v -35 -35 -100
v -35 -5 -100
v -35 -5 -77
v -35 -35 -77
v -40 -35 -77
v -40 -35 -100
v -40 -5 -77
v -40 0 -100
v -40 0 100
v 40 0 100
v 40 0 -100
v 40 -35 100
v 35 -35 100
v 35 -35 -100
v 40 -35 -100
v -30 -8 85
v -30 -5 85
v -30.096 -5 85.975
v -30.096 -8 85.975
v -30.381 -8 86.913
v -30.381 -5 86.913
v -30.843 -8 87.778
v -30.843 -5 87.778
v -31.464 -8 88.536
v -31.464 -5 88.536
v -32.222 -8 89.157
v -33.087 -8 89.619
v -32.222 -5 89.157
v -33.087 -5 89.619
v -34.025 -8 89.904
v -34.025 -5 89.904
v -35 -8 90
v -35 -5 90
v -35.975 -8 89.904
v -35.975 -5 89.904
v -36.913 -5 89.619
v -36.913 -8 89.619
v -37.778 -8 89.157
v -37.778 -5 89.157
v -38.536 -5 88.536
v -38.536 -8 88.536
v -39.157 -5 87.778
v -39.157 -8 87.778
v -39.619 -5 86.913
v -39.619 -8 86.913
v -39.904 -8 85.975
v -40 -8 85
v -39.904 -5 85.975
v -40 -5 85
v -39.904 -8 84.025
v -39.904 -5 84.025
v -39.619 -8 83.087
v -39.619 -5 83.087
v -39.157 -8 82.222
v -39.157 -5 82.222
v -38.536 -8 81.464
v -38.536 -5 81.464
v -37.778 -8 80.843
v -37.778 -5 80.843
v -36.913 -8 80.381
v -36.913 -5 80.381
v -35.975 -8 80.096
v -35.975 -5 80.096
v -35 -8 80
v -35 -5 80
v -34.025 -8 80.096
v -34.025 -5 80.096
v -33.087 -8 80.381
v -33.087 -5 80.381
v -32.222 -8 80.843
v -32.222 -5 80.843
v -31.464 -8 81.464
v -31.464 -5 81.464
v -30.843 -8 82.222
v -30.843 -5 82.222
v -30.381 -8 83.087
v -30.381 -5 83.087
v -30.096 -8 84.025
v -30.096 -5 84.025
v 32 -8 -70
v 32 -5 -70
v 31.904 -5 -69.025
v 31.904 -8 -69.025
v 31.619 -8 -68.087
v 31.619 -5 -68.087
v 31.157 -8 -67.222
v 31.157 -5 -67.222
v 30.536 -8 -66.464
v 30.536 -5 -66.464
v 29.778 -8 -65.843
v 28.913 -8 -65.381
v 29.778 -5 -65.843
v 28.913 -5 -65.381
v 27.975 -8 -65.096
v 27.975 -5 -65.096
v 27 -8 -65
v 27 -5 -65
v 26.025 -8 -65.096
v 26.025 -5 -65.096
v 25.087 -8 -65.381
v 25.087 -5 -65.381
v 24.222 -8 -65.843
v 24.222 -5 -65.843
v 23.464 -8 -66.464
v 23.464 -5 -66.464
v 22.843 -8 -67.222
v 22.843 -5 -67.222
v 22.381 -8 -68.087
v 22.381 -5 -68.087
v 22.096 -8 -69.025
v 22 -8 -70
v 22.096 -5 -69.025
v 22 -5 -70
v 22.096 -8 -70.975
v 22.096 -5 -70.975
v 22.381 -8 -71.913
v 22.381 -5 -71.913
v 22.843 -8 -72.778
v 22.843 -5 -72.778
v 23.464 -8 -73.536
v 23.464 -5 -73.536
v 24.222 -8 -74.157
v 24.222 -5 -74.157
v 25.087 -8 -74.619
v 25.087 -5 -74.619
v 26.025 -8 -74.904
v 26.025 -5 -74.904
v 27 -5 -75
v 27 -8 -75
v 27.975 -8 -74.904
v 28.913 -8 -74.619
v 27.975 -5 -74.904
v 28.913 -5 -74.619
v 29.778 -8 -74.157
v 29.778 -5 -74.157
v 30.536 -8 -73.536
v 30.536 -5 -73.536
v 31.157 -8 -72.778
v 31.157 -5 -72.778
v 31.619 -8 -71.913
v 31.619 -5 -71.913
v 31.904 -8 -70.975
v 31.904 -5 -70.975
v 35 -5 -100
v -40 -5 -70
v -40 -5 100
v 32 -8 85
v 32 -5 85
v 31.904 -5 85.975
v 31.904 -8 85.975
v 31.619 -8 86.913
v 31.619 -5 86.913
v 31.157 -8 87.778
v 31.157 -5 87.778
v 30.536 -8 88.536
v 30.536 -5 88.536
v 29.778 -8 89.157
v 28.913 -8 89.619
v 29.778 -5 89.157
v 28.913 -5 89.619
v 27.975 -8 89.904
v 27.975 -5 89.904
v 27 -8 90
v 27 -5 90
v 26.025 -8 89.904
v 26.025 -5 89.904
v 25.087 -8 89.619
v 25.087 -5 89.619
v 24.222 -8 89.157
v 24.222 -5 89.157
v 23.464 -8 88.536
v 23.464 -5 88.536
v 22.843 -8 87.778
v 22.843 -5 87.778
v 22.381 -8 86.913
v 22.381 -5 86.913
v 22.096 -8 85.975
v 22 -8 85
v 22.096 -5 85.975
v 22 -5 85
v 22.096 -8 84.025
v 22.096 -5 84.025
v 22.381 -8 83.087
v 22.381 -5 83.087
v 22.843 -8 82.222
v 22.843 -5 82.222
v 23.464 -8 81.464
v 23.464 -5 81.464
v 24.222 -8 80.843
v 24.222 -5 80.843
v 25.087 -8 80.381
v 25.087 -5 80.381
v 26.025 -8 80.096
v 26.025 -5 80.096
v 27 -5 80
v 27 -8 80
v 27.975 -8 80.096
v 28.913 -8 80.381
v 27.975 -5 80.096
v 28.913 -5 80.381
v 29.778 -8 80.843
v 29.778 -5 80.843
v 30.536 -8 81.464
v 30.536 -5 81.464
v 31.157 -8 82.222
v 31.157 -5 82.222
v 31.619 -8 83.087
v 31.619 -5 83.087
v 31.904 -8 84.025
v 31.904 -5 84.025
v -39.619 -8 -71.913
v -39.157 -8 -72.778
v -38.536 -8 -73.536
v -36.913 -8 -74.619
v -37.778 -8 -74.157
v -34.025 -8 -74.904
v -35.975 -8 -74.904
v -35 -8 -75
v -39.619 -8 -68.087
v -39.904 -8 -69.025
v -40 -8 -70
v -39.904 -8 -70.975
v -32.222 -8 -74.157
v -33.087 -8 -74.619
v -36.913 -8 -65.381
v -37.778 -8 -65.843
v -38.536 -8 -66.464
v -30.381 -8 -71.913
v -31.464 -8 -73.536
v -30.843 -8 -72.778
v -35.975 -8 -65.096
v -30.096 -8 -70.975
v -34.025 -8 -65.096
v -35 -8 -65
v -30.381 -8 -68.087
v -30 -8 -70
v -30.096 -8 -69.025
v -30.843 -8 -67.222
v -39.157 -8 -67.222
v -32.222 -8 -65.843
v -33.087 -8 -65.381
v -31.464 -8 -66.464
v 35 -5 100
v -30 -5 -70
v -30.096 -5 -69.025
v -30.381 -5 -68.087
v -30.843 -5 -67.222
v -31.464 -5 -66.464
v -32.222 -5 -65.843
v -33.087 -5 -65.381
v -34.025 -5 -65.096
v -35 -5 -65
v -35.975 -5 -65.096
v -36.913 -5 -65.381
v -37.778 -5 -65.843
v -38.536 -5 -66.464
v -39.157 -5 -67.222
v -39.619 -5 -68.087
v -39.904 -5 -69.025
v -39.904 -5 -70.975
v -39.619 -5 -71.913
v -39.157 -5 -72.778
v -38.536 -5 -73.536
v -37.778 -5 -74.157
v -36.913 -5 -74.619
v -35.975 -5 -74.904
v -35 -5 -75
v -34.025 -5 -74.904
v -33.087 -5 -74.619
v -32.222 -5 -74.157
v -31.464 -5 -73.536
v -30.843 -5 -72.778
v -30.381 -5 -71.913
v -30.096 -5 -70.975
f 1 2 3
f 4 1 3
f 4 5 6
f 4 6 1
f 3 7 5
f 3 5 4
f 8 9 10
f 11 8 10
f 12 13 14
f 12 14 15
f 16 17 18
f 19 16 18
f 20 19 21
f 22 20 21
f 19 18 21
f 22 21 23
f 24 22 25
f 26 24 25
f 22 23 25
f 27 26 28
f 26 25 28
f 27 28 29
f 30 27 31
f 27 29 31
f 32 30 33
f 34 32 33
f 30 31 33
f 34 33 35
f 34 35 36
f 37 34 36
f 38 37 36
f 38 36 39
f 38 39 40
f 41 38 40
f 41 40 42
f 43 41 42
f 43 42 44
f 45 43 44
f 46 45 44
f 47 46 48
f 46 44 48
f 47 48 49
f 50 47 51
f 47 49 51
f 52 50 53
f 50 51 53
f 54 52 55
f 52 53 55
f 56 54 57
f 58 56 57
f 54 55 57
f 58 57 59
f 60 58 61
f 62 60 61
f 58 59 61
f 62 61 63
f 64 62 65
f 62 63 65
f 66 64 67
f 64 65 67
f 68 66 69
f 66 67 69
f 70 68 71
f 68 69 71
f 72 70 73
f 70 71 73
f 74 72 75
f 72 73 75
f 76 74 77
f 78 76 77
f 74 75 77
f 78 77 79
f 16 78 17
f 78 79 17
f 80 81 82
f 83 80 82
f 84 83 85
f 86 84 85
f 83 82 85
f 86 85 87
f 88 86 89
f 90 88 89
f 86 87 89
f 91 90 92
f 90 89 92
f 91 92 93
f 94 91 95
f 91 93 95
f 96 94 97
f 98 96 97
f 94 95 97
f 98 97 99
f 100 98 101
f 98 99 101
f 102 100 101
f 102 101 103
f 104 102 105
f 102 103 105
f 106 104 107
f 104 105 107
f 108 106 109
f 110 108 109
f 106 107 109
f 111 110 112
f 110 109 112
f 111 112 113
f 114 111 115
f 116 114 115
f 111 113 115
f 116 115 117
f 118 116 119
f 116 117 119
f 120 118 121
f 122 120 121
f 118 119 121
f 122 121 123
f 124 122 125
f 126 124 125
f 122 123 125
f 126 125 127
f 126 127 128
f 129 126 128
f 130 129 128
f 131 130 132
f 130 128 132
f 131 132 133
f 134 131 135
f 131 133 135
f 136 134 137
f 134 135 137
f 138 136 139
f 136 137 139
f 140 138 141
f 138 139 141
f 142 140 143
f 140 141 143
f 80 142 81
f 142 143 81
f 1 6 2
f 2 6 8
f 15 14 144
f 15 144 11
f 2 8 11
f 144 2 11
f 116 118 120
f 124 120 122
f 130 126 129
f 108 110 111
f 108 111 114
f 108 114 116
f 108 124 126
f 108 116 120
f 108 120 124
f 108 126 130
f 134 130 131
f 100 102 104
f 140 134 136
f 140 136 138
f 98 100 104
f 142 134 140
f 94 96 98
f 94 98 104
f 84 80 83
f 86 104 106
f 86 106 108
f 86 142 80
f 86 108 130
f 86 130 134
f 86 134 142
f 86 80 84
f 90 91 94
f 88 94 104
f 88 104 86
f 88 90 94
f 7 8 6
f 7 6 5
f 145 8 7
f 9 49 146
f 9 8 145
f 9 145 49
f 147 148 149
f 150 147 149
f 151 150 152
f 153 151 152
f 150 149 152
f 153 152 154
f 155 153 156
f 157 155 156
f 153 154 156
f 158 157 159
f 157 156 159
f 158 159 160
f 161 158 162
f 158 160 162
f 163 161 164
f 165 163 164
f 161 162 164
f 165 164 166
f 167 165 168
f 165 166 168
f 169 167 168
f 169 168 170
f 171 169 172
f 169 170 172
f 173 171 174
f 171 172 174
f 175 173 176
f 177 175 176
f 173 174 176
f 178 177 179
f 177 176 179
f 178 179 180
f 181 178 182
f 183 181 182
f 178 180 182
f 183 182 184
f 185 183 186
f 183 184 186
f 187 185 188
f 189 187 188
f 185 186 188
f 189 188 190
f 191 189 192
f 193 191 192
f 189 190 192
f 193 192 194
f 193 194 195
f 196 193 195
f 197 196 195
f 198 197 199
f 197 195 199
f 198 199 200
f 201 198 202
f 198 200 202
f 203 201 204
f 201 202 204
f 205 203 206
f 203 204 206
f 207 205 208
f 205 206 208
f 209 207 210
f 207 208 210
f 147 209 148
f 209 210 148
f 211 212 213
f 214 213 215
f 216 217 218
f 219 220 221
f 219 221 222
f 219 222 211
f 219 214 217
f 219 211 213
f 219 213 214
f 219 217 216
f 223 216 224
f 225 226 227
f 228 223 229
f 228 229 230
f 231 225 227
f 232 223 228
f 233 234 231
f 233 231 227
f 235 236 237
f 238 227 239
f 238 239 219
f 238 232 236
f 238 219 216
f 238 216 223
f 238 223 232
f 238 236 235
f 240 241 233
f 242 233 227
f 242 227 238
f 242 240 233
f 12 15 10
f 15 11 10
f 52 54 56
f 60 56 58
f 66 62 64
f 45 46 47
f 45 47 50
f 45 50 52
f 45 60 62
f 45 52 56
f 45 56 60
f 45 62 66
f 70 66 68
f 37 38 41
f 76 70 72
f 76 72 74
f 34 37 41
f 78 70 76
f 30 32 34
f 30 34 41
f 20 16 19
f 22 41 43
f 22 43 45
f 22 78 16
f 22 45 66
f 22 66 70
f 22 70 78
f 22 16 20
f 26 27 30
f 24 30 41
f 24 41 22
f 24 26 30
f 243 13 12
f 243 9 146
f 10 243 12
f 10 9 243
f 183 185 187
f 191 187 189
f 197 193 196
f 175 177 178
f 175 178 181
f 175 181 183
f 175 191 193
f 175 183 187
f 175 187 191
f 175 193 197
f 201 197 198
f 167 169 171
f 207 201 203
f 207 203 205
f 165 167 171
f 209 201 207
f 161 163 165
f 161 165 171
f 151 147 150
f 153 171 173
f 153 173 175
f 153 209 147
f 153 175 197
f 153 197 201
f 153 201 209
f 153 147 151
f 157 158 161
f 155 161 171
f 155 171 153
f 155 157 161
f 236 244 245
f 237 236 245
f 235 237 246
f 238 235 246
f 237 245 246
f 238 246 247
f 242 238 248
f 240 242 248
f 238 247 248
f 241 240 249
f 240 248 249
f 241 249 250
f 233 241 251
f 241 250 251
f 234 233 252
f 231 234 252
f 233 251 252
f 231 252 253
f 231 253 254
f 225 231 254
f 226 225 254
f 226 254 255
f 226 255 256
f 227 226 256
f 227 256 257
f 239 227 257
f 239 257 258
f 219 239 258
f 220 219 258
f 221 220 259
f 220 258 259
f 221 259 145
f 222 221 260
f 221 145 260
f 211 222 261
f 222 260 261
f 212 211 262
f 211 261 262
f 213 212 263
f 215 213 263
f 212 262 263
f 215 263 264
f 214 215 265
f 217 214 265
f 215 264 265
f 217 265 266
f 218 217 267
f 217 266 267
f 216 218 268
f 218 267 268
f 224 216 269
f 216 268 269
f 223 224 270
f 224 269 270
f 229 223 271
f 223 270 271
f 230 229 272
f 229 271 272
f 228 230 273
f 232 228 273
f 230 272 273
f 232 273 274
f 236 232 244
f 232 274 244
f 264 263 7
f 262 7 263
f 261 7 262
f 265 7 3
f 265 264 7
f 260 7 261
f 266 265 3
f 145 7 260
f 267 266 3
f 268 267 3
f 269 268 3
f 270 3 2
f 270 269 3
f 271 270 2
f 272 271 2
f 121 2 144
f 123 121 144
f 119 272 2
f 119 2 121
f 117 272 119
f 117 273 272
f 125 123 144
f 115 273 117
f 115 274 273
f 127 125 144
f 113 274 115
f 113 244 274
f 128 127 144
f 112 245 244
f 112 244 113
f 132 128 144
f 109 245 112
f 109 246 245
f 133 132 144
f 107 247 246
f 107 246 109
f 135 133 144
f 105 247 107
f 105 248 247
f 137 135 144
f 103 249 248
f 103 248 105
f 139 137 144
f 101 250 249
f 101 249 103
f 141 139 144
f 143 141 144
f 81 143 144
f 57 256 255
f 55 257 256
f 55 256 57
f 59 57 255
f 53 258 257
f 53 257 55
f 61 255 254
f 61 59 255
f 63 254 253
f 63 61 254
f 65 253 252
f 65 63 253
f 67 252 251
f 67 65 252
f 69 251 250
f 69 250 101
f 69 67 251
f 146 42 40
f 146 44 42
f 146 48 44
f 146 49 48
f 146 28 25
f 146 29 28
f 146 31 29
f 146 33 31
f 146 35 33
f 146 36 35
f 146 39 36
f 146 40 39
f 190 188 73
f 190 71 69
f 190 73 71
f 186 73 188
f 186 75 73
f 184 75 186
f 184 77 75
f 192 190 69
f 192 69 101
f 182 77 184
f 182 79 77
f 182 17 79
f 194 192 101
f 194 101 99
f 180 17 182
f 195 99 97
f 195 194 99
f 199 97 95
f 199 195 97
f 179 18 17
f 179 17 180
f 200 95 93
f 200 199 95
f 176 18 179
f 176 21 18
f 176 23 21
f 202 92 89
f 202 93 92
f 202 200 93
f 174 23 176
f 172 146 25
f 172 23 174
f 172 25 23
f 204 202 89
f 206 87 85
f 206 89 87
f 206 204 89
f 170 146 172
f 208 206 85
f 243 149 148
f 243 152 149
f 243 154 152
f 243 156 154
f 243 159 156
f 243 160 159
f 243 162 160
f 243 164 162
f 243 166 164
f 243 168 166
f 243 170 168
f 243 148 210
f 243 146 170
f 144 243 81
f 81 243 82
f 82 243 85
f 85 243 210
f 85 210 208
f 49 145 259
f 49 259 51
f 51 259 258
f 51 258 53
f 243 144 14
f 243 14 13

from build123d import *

# Parameters (mm, degrees)
SKETCH_W      = 80
SKETCH_H      = 200
PAD_DEPTH     = 5
SKETCH001_R   = 5
PAD001_DEPTH  = 3
SKETCH002_W   = 5
SKETCH002_H   = 200
SKETCH002_H_2 = 23
PAD002_DEPTH  = 30


with BuildPart() as part:
    # Sketch → Pad (new body)
    with BuildSketch(Plane.XZ):
        Rectangle(SKETCH_W, SKETCH_H)
    extrude(amount=PAD_DEPTH)

    # Sketch001 (on Face6 of Pad) → Pad001 (join)
    with BuildSketch(Plane.XZ.offset(5)):
        with Locations((-35, 85)):
            Circle(SKETCH001_R)
        with Locations((27, 85)):
            Circle(SKETCH001_R)
        with Locations((-35, -70)):
            Circle(SKETCH001_R)
        with Locations((27, -70)):
            Circle(SKETCH001_R)
    extrude(amount=PAD001_DEPTH)

    # Sketch002 (on Face5 of Pad001) → Pad002 (join)
    with BuildSketch(Plane.XZ.offset(5)):
        with Locations((37.5, 0)):
            Rectangle(SKETCH002_W, SKETCH002_H)
        with Locations((-37.5, -88.5)):
            Rectangle(SKETCH002_W, SKETCH002_H_2)
    extrude(amount=PAD002_DEPTH)


solid = part.part
